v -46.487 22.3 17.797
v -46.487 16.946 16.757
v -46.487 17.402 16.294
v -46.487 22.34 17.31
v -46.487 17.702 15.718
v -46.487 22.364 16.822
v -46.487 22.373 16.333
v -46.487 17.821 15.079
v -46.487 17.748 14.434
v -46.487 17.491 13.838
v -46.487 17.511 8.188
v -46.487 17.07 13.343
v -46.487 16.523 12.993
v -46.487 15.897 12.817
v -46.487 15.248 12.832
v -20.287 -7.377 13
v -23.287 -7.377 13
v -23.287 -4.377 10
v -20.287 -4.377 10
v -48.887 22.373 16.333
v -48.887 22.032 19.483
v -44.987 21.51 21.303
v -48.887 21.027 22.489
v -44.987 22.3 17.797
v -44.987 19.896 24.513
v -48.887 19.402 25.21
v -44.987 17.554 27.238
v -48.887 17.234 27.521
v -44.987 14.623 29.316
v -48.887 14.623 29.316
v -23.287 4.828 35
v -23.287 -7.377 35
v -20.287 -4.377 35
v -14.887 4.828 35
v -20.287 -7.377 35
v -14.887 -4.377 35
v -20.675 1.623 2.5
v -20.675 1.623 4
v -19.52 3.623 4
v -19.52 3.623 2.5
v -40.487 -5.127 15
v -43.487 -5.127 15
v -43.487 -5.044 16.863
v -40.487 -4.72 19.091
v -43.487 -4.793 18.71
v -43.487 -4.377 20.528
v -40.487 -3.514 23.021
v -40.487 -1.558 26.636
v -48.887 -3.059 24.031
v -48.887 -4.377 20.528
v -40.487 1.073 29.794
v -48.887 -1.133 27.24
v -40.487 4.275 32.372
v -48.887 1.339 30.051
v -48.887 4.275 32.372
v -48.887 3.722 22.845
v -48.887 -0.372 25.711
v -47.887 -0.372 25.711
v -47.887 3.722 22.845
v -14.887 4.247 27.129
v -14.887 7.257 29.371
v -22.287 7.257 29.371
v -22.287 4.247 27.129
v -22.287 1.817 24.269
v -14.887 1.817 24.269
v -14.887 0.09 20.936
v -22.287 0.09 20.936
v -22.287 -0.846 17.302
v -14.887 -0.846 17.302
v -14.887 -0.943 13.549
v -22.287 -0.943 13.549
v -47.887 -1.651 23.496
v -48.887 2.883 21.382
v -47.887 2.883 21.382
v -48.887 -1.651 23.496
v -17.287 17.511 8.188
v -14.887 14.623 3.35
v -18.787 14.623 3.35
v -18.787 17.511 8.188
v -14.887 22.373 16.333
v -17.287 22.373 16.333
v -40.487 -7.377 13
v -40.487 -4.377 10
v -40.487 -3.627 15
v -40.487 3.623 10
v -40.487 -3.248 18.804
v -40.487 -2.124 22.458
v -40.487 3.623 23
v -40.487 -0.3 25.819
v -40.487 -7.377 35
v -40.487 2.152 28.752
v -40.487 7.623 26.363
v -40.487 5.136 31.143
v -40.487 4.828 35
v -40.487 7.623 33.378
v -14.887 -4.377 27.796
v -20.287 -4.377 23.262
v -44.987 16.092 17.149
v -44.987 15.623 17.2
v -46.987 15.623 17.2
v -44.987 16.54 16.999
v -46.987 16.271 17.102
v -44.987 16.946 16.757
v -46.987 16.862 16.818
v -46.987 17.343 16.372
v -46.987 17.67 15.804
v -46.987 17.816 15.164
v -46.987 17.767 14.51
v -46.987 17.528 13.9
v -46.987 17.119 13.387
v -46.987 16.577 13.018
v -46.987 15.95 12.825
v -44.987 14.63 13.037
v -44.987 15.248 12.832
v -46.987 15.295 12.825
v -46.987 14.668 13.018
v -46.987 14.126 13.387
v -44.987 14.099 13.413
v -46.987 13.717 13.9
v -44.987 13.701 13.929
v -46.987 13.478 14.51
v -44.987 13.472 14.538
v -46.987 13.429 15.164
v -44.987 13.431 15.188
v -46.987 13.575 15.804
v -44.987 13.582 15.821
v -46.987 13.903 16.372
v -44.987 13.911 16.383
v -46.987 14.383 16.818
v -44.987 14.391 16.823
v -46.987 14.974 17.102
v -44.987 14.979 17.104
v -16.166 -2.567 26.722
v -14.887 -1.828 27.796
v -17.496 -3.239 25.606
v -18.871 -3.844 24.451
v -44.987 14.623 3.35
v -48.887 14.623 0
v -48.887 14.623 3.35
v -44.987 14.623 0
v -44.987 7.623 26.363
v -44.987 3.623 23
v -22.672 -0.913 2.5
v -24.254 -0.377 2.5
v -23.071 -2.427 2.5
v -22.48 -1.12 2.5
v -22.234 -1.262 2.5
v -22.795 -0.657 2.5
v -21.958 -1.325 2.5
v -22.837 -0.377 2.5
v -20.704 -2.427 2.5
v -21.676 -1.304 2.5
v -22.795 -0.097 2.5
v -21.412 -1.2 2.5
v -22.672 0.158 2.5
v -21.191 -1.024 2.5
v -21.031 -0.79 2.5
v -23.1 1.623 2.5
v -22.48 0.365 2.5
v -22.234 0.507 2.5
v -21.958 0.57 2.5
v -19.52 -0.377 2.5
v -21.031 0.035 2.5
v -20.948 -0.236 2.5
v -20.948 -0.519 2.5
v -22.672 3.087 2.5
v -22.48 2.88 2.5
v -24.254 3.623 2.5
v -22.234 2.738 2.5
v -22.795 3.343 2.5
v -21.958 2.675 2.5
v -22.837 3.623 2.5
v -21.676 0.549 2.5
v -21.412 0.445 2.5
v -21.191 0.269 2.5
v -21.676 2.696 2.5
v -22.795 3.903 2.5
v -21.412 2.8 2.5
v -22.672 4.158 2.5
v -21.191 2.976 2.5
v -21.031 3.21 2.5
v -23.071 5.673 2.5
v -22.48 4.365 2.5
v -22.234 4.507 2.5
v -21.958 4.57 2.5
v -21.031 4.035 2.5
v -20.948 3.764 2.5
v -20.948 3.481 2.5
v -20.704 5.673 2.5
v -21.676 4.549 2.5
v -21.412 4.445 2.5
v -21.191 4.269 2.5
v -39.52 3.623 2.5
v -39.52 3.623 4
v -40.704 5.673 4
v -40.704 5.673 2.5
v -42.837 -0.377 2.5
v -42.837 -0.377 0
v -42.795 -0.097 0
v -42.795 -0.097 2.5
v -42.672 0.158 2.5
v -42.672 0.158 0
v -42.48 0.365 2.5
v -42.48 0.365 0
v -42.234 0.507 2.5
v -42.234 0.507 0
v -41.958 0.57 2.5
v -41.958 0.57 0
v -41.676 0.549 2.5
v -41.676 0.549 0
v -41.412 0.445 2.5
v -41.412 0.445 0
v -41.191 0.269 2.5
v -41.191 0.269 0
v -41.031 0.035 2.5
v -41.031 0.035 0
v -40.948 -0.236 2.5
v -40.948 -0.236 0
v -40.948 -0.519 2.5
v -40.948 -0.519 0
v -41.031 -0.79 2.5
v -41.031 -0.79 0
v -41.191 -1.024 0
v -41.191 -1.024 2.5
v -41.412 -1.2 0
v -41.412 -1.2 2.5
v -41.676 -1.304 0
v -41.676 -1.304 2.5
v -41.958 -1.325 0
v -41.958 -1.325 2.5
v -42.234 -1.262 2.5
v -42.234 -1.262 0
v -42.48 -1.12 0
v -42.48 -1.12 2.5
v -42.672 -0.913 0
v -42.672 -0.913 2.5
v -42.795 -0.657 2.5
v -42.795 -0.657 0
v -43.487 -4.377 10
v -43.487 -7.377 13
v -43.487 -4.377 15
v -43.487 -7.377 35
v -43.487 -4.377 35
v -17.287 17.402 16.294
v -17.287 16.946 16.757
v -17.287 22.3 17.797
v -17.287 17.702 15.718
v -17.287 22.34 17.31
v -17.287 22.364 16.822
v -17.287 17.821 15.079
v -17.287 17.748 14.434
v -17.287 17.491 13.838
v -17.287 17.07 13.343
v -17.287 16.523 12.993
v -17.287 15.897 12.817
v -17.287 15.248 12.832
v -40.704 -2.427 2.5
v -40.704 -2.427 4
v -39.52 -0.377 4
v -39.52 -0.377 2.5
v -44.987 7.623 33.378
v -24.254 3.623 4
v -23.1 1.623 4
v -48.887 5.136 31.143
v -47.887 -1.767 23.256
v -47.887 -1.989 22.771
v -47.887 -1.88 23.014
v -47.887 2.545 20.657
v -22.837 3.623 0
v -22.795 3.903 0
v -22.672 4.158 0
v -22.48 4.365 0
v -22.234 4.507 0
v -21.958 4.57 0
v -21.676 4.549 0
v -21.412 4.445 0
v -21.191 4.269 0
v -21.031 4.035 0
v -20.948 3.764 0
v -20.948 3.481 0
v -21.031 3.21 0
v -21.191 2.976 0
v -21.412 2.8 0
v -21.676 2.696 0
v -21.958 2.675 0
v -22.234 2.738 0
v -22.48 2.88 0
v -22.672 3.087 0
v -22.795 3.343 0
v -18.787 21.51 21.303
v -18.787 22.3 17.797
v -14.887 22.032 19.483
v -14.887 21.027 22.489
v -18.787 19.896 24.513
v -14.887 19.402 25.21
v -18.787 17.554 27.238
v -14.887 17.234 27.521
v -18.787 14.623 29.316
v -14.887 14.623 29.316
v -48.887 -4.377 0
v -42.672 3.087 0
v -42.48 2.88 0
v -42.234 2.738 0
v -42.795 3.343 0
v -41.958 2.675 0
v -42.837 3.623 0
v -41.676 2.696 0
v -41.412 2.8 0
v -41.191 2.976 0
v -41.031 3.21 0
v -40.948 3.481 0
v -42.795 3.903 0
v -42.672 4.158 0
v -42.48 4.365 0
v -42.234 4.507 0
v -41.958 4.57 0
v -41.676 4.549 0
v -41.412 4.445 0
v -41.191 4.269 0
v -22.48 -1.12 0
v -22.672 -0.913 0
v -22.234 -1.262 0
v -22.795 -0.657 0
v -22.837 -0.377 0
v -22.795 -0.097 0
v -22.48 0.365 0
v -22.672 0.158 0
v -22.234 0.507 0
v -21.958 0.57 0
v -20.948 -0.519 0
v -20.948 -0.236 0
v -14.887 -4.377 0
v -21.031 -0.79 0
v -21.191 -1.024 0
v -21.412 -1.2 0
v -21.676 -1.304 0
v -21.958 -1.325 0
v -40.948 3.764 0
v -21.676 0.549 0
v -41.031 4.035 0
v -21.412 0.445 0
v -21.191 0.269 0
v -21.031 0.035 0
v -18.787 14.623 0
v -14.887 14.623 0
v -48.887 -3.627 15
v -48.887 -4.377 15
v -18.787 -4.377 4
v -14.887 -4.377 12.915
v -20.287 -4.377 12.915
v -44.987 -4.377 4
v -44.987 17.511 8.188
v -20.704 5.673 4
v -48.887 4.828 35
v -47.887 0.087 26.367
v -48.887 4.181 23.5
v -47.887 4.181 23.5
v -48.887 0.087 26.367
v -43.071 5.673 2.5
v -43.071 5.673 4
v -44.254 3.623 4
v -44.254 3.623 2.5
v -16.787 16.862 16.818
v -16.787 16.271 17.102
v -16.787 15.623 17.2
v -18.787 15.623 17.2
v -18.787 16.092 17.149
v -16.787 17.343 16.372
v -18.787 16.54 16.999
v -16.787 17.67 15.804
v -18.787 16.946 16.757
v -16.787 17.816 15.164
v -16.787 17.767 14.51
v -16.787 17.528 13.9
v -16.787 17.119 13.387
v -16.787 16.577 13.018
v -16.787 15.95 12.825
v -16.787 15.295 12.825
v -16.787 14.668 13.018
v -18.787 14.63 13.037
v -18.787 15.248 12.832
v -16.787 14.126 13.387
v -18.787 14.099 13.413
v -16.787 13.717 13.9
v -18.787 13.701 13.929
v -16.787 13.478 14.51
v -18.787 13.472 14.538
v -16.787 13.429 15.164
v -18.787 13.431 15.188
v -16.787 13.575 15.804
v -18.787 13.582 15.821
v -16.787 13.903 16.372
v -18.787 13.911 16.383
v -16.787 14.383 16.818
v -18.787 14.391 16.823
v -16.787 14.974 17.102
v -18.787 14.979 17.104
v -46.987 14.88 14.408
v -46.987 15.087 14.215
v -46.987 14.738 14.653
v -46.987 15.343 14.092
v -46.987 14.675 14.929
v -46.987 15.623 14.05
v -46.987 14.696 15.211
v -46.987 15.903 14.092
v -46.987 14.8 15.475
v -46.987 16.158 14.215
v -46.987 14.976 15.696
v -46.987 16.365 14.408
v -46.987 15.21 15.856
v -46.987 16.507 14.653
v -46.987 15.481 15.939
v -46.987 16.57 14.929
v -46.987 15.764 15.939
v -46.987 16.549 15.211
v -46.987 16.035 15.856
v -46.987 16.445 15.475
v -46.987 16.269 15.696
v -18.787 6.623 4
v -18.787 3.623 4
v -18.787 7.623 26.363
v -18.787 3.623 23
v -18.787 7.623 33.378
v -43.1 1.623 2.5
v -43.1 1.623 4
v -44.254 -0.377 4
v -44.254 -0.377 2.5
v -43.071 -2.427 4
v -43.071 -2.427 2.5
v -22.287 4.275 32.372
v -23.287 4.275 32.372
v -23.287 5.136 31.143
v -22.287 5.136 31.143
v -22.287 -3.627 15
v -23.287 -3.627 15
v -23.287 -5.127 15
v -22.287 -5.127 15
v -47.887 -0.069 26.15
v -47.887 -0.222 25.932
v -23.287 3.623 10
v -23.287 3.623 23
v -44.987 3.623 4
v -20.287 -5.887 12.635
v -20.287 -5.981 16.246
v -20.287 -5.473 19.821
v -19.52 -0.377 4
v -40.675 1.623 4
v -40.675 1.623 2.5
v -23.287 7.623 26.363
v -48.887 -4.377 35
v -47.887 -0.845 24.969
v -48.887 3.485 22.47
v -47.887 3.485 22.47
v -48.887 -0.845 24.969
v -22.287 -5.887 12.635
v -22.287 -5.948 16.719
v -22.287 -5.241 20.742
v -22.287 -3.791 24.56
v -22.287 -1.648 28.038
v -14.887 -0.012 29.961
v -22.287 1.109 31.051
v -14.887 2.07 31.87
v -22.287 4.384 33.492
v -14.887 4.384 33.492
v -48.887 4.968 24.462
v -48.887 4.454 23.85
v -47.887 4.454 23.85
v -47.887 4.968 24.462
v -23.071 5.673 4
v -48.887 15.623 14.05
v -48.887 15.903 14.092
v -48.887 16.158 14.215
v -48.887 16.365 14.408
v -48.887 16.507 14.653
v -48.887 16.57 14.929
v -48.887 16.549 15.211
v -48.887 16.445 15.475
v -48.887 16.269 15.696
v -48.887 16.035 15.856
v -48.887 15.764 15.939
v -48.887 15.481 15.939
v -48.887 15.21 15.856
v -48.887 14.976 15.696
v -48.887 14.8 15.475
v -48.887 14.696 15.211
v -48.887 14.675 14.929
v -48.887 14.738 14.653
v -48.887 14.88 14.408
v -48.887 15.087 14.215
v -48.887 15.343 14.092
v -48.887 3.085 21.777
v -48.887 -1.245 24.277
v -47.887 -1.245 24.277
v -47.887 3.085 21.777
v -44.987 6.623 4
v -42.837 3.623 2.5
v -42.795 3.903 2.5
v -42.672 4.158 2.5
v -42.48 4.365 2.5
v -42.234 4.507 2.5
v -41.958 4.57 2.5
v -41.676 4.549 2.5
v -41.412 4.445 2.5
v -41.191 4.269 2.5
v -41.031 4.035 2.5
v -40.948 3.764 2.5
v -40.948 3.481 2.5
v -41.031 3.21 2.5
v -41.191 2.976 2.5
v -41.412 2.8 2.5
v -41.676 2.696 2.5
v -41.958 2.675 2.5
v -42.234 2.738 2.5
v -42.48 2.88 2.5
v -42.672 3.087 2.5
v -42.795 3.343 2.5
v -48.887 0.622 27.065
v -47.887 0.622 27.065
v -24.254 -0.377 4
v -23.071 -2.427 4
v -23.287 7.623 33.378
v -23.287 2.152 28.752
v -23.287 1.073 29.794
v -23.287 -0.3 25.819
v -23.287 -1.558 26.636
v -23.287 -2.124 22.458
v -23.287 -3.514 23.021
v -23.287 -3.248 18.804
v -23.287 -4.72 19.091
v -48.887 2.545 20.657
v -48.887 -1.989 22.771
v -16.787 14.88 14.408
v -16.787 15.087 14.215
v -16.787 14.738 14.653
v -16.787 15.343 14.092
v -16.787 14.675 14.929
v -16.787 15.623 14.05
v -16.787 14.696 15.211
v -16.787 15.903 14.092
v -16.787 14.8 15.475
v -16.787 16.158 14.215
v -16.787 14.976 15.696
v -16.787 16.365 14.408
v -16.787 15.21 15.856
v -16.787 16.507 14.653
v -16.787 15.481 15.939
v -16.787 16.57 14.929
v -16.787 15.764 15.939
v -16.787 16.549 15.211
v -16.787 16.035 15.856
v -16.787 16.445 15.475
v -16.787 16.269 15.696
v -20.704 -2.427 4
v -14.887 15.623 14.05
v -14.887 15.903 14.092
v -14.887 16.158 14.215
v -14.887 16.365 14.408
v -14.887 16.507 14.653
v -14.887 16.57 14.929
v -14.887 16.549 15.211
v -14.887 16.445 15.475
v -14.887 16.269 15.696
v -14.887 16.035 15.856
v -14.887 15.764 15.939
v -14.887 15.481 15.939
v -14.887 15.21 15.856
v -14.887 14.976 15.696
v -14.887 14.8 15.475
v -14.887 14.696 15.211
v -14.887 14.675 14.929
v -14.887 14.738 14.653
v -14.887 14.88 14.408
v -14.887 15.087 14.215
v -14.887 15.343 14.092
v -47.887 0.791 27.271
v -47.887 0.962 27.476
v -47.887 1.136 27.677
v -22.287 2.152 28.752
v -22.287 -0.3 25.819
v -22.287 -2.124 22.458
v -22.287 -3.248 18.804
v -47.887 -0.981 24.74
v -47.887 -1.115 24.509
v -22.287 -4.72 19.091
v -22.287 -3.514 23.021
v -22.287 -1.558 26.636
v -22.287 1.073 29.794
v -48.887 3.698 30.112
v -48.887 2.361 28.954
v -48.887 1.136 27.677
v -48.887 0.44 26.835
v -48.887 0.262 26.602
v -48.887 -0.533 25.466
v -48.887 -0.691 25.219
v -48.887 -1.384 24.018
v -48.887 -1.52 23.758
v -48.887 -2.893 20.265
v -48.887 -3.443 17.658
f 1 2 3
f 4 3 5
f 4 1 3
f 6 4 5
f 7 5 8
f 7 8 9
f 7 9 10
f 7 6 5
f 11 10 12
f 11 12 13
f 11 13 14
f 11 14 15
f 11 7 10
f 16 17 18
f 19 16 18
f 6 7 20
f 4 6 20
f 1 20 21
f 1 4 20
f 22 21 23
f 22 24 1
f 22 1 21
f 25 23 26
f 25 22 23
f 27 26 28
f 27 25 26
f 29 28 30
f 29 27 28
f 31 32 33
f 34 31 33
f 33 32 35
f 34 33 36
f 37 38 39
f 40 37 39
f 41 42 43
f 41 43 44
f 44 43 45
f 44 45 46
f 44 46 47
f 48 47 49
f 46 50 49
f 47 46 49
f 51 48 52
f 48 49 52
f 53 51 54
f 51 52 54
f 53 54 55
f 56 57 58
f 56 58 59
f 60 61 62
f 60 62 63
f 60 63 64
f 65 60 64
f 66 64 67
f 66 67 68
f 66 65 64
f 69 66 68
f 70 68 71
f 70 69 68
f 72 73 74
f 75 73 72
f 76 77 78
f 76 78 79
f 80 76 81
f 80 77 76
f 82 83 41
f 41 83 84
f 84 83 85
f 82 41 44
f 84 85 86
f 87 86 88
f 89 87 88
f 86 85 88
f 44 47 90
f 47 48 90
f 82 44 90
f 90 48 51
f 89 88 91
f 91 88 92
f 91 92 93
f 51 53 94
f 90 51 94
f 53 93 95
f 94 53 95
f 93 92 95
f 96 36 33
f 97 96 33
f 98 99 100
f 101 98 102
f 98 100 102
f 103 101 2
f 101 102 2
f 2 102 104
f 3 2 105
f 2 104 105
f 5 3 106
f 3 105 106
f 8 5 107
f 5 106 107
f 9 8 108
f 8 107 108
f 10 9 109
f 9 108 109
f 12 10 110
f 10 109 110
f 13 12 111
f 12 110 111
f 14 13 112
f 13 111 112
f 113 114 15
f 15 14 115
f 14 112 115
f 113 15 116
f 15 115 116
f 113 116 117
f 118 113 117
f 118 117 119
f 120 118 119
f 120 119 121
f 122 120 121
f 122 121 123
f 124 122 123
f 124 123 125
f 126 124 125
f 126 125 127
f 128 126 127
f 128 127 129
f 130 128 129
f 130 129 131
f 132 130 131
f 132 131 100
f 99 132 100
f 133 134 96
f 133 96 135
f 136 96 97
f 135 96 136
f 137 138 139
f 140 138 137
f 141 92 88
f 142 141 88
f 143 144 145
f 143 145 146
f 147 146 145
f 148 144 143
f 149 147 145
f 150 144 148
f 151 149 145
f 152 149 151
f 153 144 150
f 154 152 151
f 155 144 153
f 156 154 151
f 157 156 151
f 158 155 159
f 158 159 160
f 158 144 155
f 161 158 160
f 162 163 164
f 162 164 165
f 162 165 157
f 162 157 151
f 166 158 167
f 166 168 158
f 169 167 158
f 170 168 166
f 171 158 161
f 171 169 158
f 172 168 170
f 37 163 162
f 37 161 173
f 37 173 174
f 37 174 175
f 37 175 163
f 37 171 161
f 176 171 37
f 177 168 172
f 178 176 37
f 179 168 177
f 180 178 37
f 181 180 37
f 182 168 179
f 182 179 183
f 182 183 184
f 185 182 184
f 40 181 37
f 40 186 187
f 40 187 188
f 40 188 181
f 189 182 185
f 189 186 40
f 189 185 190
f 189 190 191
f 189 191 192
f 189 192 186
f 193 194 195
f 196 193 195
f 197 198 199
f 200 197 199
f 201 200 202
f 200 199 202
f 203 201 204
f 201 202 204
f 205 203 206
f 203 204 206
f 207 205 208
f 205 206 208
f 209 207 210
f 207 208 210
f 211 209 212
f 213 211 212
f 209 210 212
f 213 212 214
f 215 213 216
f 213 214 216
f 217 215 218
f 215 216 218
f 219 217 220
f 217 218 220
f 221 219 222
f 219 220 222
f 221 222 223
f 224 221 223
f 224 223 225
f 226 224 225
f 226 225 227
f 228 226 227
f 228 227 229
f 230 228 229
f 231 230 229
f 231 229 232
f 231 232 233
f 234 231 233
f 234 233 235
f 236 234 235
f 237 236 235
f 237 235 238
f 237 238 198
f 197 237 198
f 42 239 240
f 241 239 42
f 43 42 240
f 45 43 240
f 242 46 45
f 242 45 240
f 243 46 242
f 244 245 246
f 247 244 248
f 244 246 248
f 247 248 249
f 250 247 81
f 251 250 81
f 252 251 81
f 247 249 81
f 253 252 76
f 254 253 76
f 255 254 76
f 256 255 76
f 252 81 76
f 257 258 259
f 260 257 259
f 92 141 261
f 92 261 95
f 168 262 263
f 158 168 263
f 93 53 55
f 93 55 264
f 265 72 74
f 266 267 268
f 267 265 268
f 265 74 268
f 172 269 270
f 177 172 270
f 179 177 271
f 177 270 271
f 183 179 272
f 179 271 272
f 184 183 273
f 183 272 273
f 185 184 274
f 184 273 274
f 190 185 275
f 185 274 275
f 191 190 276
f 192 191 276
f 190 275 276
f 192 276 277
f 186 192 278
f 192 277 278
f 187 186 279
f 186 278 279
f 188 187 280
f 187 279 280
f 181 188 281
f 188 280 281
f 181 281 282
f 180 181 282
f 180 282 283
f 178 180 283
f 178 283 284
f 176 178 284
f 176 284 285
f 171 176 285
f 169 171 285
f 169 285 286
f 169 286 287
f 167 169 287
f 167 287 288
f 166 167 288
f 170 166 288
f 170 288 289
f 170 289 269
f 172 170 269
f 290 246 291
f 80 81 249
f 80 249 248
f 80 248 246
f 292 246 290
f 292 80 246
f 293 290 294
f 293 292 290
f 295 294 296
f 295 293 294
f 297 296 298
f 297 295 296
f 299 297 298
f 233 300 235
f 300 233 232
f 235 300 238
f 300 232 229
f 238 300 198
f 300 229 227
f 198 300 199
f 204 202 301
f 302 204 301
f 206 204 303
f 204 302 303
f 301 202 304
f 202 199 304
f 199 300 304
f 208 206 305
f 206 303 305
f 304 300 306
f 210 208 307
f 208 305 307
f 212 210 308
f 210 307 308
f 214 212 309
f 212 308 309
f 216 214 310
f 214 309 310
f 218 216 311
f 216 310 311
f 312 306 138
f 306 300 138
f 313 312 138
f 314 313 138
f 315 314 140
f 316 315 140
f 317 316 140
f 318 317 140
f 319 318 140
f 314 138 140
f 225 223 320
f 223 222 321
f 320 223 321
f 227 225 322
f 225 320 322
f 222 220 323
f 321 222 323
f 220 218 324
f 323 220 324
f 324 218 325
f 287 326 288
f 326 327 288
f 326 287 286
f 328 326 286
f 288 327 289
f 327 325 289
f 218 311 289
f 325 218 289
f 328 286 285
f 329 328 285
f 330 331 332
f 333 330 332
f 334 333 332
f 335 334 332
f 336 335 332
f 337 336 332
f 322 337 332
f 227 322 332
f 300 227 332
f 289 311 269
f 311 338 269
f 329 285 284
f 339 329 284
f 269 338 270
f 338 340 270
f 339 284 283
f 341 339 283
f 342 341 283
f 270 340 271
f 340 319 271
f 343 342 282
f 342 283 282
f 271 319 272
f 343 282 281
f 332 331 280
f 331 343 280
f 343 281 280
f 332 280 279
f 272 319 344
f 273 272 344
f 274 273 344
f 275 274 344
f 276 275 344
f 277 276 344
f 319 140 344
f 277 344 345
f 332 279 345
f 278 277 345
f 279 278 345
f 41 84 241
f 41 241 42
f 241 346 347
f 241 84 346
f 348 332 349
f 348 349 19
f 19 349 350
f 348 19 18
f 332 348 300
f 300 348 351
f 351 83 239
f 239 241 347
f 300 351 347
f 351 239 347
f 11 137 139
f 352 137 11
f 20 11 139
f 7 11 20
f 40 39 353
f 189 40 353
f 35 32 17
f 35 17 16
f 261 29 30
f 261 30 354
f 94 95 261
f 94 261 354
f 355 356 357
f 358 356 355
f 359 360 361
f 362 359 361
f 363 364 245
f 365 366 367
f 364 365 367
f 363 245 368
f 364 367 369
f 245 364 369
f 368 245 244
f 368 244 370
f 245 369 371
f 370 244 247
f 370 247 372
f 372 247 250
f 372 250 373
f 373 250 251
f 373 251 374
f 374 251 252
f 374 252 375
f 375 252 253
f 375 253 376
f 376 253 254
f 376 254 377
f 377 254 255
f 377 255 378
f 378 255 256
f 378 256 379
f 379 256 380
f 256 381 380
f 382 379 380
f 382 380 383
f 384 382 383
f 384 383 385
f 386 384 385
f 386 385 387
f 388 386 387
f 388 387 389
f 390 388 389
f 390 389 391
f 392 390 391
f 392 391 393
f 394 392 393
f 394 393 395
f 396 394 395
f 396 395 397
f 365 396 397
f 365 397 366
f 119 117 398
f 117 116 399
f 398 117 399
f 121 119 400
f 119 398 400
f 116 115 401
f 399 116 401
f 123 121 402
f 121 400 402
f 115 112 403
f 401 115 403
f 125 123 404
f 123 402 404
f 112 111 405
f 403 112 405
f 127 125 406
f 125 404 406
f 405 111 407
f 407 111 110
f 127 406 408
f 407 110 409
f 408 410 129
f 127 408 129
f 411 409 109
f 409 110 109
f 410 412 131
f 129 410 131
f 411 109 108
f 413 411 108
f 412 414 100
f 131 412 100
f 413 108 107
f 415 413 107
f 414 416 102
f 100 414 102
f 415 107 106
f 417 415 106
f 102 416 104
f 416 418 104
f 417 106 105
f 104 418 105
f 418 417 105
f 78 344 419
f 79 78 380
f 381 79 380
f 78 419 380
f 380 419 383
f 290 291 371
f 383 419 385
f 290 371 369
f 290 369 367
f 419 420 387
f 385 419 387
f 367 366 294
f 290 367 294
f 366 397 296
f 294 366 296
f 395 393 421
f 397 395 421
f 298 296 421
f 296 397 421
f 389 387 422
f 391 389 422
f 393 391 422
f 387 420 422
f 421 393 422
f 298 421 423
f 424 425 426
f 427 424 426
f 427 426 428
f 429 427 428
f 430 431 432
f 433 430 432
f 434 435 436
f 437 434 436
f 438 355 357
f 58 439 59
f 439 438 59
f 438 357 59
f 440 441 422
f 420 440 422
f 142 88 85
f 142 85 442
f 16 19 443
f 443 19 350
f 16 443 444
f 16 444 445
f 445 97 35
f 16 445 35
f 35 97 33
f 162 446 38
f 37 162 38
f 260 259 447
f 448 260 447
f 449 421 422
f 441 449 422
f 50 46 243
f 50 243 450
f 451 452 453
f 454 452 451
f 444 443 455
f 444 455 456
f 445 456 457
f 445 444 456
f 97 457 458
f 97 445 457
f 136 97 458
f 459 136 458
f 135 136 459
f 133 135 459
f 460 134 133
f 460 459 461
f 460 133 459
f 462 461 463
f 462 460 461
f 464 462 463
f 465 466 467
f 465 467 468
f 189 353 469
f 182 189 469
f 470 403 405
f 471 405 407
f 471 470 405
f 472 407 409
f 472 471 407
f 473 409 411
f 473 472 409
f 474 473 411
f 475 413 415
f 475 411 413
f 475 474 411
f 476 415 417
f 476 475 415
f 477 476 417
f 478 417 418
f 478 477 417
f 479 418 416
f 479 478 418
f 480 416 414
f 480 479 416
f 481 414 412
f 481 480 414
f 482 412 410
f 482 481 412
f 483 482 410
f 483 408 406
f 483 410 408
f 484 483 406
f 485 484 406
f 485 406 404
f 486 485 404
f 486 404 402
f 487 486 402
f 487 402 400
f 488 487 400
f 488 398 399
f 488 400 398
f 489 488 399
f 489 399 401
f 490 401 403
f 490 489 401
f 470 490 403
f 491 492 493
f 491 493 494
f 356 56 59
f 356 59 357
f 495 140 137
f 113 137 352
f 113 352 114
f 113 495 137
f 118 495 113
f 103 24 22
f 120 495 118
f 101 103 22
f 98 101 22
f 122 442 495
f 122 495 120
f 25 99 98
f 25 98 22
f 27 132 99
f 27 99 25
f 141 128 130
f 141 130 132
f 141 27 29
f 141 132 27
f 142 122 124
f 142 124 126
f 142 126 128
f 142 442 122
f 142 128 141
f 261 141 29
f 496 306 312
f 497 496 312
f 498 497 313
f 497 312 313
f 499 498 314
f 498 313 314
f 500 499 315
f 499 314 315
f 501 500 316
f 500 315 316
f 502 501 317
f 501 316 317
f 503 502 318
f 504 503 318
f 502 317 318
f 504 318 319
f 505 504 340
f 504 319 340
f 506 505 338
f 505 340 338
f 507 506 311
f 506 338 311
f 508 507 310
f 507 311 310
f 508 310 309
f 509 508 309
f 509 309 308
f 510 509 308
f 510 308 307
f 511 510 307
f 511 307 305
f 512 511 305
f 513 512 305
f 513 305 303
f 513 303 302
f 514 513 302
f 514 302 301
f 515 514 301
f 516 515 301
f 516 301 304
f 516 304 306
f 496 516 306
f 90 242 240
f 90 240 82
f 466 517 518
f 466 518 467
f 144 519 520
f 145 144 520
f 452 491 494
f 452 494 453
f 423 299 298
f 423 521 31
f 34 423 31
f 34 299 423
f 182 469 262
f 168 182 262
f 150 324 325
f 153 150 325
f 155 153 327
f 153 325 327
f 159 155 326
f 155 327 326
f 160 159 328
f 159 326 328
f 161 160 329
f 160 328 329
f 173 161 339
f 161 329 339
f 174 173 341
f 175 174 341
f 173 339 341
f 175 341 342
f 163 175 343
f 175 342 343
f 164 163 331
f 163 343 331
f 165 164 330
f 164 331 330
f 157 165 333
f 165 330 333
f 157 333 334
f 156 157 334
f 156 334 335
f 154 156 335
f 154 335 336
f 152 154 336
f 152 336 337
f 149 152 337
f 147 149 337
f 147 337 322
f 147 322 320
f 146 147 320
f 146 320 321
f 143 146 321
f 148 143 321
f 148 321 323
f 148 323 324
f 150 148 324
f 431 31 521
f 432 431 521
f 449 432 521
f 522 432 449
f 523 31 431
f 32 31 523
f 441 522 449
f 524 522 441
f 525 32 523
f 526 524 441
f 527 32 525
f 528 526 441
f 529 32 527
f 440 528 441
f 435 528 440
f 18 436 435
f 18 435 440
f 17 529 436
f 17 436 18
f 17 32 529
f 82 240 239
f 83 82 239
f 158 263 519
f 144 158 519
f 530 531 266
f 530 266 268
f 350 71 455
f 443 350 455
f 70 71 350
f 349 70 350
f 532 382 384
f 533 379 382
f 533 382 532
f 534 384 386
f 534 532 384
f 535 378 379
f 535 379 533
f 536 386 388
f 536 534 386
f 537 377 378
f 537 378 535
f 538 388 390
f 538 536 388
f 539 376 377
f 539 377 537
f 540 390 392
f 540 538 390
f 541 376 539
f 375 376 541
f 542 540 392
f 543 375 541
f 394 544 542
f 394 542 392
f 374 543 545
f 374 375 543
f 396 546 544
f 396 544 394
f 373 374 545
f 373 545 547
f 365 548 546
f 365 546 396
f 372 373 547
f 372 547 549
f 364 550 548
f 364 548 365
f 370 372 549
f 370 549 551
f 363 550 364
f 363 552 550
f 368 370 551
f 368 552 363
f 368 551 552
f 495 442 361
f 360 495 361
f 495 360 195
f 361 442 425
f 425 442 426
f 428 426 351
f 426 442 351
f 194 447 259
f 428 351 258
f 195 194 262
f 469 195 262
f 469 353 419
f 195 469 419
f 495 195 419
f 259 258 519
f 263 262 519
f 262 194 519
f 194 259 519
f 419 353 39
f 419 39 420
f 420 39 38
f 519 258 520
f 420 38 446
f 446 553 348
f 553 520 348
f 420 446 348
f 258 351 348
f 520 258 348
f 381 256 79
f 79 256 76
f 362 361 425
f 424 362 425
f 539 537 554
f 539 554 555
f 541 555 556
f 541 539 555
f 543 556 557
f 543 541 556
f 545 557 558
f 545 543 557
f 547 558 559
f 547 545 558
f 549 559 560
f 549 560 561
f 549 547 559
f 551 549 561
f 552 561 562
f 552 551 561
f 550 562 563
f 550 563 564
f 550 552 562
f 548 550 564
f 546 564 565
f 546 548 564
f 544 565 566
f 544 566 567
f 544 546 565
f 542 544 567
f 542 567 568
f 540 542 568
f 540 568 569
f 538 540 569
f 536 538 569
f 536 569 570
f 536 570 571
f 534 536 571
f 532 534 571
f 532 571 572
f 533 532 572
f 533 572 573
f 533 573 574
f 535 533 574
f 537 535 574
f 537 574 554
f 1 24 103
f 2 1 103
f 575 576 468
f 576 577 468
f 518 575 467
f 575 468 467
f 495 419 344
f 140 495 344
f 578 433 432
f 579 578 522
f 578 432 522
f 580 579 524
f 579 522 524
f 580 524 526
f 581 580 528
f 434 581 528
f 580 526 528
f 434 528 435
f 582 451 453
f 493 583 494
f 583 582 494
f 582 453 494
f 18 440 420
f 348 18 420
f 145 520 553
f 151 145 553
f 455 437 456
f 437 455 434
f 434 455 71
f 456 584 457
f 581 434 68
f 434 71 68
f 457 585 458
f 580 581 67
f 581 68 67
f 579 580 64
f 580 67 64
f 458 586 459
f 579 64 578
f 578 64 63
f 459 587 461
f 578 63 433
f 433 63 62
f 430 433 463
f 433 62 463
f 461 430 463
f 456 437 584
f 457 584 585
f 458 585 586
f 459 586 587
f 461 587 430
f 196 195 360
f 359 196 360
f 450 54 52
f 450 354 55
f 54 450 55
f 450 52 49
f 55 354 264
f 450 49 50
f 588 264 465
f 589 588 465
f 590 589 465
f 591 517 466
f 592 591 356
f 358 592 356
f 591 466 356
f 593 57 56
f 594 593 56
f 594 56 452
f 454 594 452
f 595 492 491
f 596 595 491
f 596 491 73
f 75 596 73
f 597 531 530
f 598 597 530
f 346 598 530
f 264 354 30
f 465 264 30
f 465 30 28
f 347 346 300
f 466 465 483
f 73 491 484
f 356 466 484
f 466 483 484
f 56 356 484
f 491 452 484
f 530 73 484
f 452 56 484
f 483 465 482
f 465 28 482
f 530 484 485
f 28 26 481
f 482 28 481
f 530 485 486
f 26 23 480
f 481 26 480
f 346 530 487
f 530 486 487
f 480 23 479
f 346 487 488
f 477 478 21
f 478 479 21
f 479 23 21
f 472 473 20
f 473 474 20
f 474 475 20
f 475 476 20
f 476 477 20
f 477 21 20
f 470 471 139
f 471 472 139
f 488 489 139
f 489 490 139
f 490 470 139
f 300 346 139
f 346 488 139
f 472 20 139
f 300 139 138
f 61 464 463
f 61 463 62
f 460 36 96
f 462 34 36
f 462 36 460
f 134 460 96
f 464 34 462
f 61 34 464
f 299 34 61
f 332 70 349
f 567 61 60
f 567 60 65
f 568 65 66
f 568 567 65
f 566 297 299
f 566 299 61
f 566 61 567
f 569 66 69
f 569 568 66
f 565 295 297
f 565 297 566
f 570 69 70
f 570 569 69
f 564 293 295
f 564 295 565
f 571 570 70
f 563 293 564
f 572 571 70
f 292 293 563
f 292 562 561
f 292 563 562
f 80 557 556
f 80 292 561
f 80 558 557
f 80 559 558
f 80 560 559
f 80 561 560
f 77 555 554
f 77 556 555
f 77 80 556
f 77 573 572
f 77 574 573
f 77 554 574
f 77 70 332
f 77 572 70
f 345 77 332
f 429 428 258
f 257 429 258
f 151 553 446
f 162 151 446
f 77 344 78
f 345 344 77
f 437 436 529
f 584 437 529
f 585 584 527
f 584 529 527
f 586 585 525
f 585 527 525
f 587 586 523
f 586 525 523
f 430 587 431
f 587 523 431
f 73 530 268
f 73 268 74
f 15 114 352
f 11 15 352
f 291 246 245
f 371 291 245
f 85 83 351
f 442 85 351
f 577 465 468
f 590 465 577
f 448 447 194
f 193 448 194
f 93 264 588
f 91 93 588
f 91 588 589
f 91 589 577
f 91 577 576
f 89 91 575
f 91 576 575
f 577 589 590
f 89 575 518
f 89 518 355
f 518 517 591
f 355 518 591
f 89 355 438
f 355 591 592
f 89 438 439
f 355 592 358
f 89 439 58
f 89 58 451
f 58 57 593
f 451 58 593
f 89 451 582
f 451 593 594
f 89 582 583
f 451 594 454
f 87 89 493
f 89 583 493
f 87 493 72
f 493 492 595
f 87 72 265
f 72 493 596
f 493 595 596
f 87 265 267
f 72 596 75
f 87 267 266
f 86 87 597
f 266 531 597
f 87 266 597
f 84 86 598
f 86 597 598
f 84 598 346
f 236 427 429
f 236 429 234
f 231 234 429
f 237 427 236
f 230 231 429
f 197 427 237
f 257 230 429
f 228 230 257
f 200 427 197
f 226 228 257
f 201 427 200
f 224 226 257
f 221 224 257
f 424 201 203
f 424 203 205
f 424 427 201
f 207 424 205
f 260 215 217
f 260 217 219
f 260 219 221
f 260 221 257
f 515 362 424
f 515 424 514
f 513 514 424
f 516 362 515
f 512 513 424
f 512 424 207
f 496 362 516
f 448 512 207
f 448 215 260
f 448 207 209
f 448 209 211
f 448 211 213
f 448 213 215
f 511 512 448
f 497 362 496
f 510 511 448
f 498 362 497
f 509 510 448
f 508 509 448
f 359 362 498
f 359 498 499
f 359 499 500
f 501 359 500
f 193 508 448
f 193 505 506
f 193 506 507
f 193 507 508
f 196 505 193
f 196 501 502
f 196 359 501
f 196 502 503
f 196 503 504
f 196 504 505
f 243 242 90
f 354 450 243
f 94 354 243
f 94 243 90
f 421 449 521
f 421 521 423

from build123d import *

# Parameters (mm, degrees)
CROQUIS1_W              = 34
CROQUIS1_H              = 19
SALIENTE_EXTRUIR1_DEPTH = 35
CROQUIS2_W              = 26.2
CROQUIS2_H              = 31
CORTAR_EXTRUIR1_DEPTH   = 25
CORTAR_EXTRUIR3_DEPTH   = 26.2
SALIENTE_EXTRUIR2_DEPTH = 34
CROQUIS10_W             = 26.2
CROQUIS10_H             = 25.966324345
CORTAR_EXTRUIR4_DEPTH   = 10
CROQUIS18_R             = 0.95
CORTAR_EXTRUIR11_DEPTH  = 4
CORTAR_EXTRUIR12_DEPTH  = 1.5
CORTAR_EXTRUIR14_START  = -34
CROQUIS21_R             = 0.95
CORTAR_EXTRUIR14_DEPTH  = 34
SALIENTE_EXTRUIR3_DEPTH = 8
CROQUIS25_W             = 3
CROQUIS25_H             = 25
SALIENTE_EXTRUIR4_DEPTH = 3
CROQUIS43_W             = 4.5
CROQUIS43_H             = 12
SALIENTE_EXTRUIR8_DEPTH = 4
CORTAR_EXTRUIR18_DEPTH  = 7.4
CORTAR_EXTRUIR16_START  = -34
CORTAR_EXTRUIR16_DEPTH  = 26.6
CORTAR_EXTRUIR20_START  = -1.5
CORTAR_EXTRUIR20_DEPTH  = 1.5
CORTAR_EXTRUIR21_DEPTH  = 27.7
CORTAR_EXTRUIR22_START  = -34
CORTAR_EXTRUIR22_DEPTH  = 34
CORTAR_EXTRUIR23_DEPTH  = 3
CROQUIS36_R             = 2.2
CORTAR_EXTRUIR24_DEPTH  = 2
CORTAR_EXTRUIR25_START  = 28.2
CROQUIS36_2_R           = 2.2
CORTAR_EXTRUIR25_DEPTH  = 28.2
CORTAR_EXTRUIR26_START  = -34
CORTAR_EXTRUIR26_DEPTH  = 34
CORTAR_EXTRUIR27_DEPTH  = 1
CORTAR_EXTRUIR28_START  = -23.2
CORTAR_EXTRUIR28_DEPTH  = 23.2
CORTAR_EXTRUIR29_DEPTH  = 26.2


with BuildPart() as part:
    # Croquis1 → Saliente-Extruir1 (new body)
    with BuildSketch(Plane.XY):
        with Locations((-31.887263086, 5.12254902)):
            Rectangle(CROQUIS1_W, CROQUIS1_H)
    extrude(amount=SALIENTE_EXTRUIR1_DEPTH)

    # Croquis2 → Cortar-Extruir1 (cut)
    with BuildSketch(Plane.XZ.offset(4.37745098)):
        with Locations((-31.887263086, 19.5)):
            Rectangle(CROQUIS2_W, CROQUIS2_H)
    extrude(amount=-CORTAR_EXTRUIR1_DEPTH, mode=Mode.SUBTRACT)

    # Croquis4 → Cortar-Extruir3 (cut)
    with BuildSketch(Plane.ZY.offset(18.787263086)):
        Polygon((4, 14.62254902), (4, 6.62254902), (0, 14.62254902), align=None)
    extrude(amount=CORTAR_EXTRUIR3_DEPTH, mode=Mode.SUBTRACT)

    # Croquis9 → Saliente-Extruir2 (add)
    with BuildSketch(Plane(origin=(-14.887263086, 0, 0), x_dir=(0, 0, -1), z_dir=(1, 0, 0))):
        with BuildLine():
            Line((-29.315831827, 14.62254902), (-3.349507482, 14.62254902))
            ThreePointArc((-3.349507482, 14.62254902), (-16.332669655, 22.37254902), (-29.315831827, 14.62254902))
        make_face()
    extrude(amount=-SALIENTE_EXTRUIR2_DEPTH)

    # Croquis10 → Cortar-Extruir4 (cut)
    with BuildSketch(Plane.XZ.offset(-14.62254902)):
        with Locations((-31.887263086, 16.332669655)):
            Rectangle(CROQUIS10_W, CROQUIS10_H)
    extrude(amount=-CORTAR_EXTRUIR4_DEPTH, mode=Mode.SUBTRACT)

    # Croquis18 → Cortar-Extruir11 (cut)
    with BuildSketch(Plane(origin=(0, 0, 0), x_dir=(-1, 0, 0), z_dir=(0, 0, -1))):
        with Locations((41.887263086, -0.37745098)):
            Circle(CROQUIS18_R)
        with Locations((21.887263086, -0.37745098)):
            Circle(CROQUIS18_R)
        with Locations((21.887263086, 3.62254902)):
            Circle(CROQUIS18_R)
        with Locations((41.887263086, 3.62254902)):
            Circle(CROQUIS18_R)
    extrude(amount=-CORTAR_EXTRUIR11_DEPTH, mode=Mode.SUBTRACT)

    # Croquis19 → Cortar-Extruir12 (cut)
    with BuildSketch(Plane.XY.offset(4)):
        Polygon((-39.520126982, -0.37745098), (-40.67482752, 1.62254902), (-39.520126982, 3.62254902), (-40.703695034, 5.67254902), (-43.070831137, 5.67254902), (-44.254399189, 3.62254902), (-43.099698651, 1.62254902), (-44.254399189, -0.37745098), (-43.070831137, -2.42745098), (-40.703695034, -2.42745098), align=None)
        Polygon((-19.520126982, -0.37745098), (-20.67482752, 1.62254902), (-19.520126982, 3.62254902), (-20.703695034, 5.67254902), (-23.070831137, 5.67254902), (-24.254399189, 3.62254902), (-23.099698651, 1.62254902), (-24.254399189, -0.37745098), (-23.070831137, -2.42745098), (-20.703695034, -2.42745098), align=None)
    extrude(amount=-CORTAR_EXTRUIR12_DEPTH, mode=Mode.SUBTRACT)

    # Croquis21 → Cortar-Extruir14 (cut)
    with BuildSketch(Plane(origin=(-14.887263086, 0, 0), x_dir=(0, 0, -1), z_dir=(1, 0, 0)).offset(CORTAR_EXTRUIR14_START)):
        with Locations((-15, 15.62254902)):
            Circle(CROQUIS21_R)
    extrude(amount=CORTAR_EXTRUIR14_DEPTH, mode=Mode.SUBTRACT)

    # Croquis23 → Saliente-Extruir3 (add)
    with BuildSketch(Plane.XZ.offset(4.37745098)):
        Polygon((-44.987263086, 35), (-40.487263086, 35), (-40.487263086, 10), (-44.987263086, 4), align=None)
        Polygon((-18.787263086, 35), (-23.287263086, 35), (-23.287263086, 10), (-18.787263086, 4), align=None)
    extrude(amount=-SALIENTE_EXTRUIR3_DEPTH)

    # Croquis25 → Saliente-Extruir4 (add)
    with BuildSketch(Plane.XZ.offset(4.37745098)):
        with Locations((-41.987263086, 22.5)):
            Rectangle(CROQUIS25_W, CROQUIS25_H)
        with Locations((-21.787263086, 22.5)):
            Rectangle(CROQUIS25_W, CROQUIS25_H)
    extrude(amount=SALIENTE_EXTRUIR4_DEPTH)

    # Croquis43 → Saliente-Extruir8 (add)
    with BuildSketch(Plane(origin=(0, 3.62254902, 0), x_dir=(1, 0, 0), z_dir=(0, 1, 0))):
        with Locations((-21.037263086, -29)):
            Rectangle(CROQUIS43_W, CROQUIS43_H)
        with Locations((-42.737263086, -29)):
            Rectangle(CROQUIS43_W, CROQUIS43_H)
    extrude(amount=SALIENTE_EXTRUIR8_DEPTH)

    # Croquis27 → Cortar-Extruir18 (cut)
    with BuildSketch(Plane(origin=(-14.887263086, 0, 0), x_dir=(0, 0, -1), z_dir=(1, 0, 0))):
        with BuildLine():
            Line((-13.549434023, -0.942577786), (-12.635457129, -5.887329478))
            ThreePointArc((-12.635457129, -5.887329478), (-24.560215782, -3.790544761), (-33.492032026, 4.383746258))
            Line((-33.492032026, 4.383746258), (-29.371216121, 7.25740019))
            ThreePointArc((-29.371216121, 7.25740019), (-22.651516826, 0.859017666), (-13.549434023, -0.942577786))
        make_face()
    extrude(amount=-CORTAR_EXTRUIR18_DEPTH, mode=Mode.SUBTRACT)

    # Croquis24 → Cortar-Extruir16 (cut)
    with BuildSketch(Plane(origin=(-14.887263086, 0, 0), x_dir=(0, 0, -1), z_dir=(1, 0, 0)).offset(CORTAR_EXTRUIR16_START)):
        with BuildLine():
            Line((-15, -3.62745098), (-15, -5.12726591))
            ThreePointArc((-15, -5.12726591), (-24.876851848, -2.625810281), (-32.372332418, 4.275439874))
            Line((-32.372332418, 4.275439874), (-31.142668885, 5.135569413))
            ThreePointArc((-31.142668885, 5.135569413), (-24.183902835, -1.295442254), (-15, -3.62745098))
        make_face()
    extrude(amount=CORTAR_EXTRUIR16_DEPTH, mode=Mode.SUBTRACT)

    # Croquis29 → Cortar-Extruir20 (cut)
    with BuildSketch(Plane.ZY.offset(18.787263086).offset(CORTAR_EXTRUIR20_START)):
        with BuildLine():
            Line((17.797402962, 22.299641931), (16.5, 15.62254902))
            ThreePointArc((16.5, 15.62254902), (15.426958984, 14.184596995), (13.743058632, 14.803953638))
            Line((13.743058632, 14.803953638), (6.296886003, 18.432060872))
            ThreePointArc((6.296886003, 18.432060872), (11.631045274, 21.603150873), (17.797402962, 22.299641931))
        make_face()
    extrude(amount=CORTAR_EXTRUIR20_DEPTH, mode=Mode.SUBTRACT)

    # Croquis29<2> → Cortar-Extruir21 (cut)
    with BuildSketch(Plane.ZY.offset(18.787263086)):
        with BuildLine():
            Line((17.797402962, 22.299641931), (16.5, 15.62254902))
            ThreePointArc((16.5, 15.62254902), (15.426958984, 14.184596995), (13.743058632, 14.803953638))
            Line((13.743058632, 14.803953638), (6.296886003, 18.432060872))
            ThreePointArc((6.296886003, 18.432060872), (11.631045274, 21.603150873), (17.797402962, 22.299641931))
        make_face()
    extrude(amount=CORTAR_EXTRUIR21_DEPTH, mode=Mode.SUBTRACT)

    # Croquis30 → Cortar-Extruir22 (cut)
    with BuildSketch(Plane.ZY.offset(48.887263086).offset(CORTAR_EXTRUIR22_START)):
        Polygon((29.315831827, 14.62254902), (35, 4.827802707), (35, 14.62254902), align=None)
    extrude(amount=CORTAR_EXTRUIR22_DEPTH, mode=Mode.SUBTRACT)

    # Croquis35 → Cortar-Extruir23 (cut)
    with BuildSketch(Plane.XZ.offset(4.37745098)):
        Polygon((-20.287263086, 23.262320252), (-14.887263086, 23.262320252), (-14.887263086, 27.796275801), align=None)
    extrude(amount=-CORTAR_EXTRUIR23_DEPTH, mode=Mode.SUBTRACT)

    # Croquis36 → Cortar-Extruir24 (cut)
    with BuildSketch(Plane.ZY.offset(18.787263086)):
        with Locations((15, 15.62254902)):
            Circle(CROQUIS36_R)
    extrude(amount=-CORTAR_EXTRUIR24_DEPTH, mode=Mode.SUBTRACT)

    # Croquis36<2> → Cortar-Extruir25 (cut)
    with BuildSketch(Plane.ZY.offset(18.787263086).offset(CORTAR_EXTRUIR25_START)):
        with Locations((15, 15.62254902)):
            Circle(CROQUIS36_2_R)
    extrude(amount=-CORTAR_EXTRUIR25_DEPTH, mode=Mode.SUBTRACT)

    # Croquis38 → Cortar-Extruir26 (cut)
    with BuildSketch(Plane.ZY.offset(48.887263086).offset(CORTAR_EXTRUIR26_START)):
        Polygon((3.349507482, 14.62254902), (16.332669655, 22.37254902), (3.349507482, 22.37254902), align=None)
    extrude(amount=CORTAR_EXTRUIR26_DEPTH, mode=Mode.SUBTRACT)

    # Croquis40 → Cortar-Extruir27 (cut)
    with BuildSketch(Plane.ZY.offset(48.887263086)):
        Polygon((24.462469518, 4.967906508), (27.804965088, 0.984475403), (27.192129534, 0.470245316), (23.849633963, 4.45367642), align=None)
        Polygon((23.499956861, 4.180731289), (26.48255433, -0.078859342), (25.827232695, -0.537720491), (22.844635226, 3.72187014), align=None)
        Polygon((22.469633136, 3.484764914), (25.069633136, -1.018567186), (24.376812813, -1.418567186), (21.776812813, 3.084764914), align=None)
        Polygon((21.381853505, 2.883100647), (23.579468466, -1.829699846), (22.854422236, -2.167794455), (20.656807275, 2.545006037), align=None)
    extrude(amount=-CORTAR_EXTRUIR27_DEPTH, mode=Mode.SUBTRACT)

    # Croquis41 → Cortar-Extruir28 (cut)
    with BuildSketch(Plane(origin=(-20.287263086, 0, 0), x_dir=(0, 0, -1), z_dir=(1, 0, 0)).offset(CORTAR_EXTRUIR28_START)):
        Polygon((-10, -4.37745098), (-10, -7.37745098), (-13, -7.37745098), align=None)
    extrude(amount=CORTAR_EXTRUIR28_DEPTH, mode=Mode.SUBTRACT)

    # Croquis44 → Cortar-Extruir29 (cut)
    with BuildSketch(Plane.ZY.offset(18.787263086)):
        Polygon((23, 7.62254902), (26.362551066, 7.62254902), (23, 3.62254902), align=None)
    extrude(amount=CORTAR_EXTRUIR29_DEPTH, mode=Mode.SUBTRACT)


solid = part.part
